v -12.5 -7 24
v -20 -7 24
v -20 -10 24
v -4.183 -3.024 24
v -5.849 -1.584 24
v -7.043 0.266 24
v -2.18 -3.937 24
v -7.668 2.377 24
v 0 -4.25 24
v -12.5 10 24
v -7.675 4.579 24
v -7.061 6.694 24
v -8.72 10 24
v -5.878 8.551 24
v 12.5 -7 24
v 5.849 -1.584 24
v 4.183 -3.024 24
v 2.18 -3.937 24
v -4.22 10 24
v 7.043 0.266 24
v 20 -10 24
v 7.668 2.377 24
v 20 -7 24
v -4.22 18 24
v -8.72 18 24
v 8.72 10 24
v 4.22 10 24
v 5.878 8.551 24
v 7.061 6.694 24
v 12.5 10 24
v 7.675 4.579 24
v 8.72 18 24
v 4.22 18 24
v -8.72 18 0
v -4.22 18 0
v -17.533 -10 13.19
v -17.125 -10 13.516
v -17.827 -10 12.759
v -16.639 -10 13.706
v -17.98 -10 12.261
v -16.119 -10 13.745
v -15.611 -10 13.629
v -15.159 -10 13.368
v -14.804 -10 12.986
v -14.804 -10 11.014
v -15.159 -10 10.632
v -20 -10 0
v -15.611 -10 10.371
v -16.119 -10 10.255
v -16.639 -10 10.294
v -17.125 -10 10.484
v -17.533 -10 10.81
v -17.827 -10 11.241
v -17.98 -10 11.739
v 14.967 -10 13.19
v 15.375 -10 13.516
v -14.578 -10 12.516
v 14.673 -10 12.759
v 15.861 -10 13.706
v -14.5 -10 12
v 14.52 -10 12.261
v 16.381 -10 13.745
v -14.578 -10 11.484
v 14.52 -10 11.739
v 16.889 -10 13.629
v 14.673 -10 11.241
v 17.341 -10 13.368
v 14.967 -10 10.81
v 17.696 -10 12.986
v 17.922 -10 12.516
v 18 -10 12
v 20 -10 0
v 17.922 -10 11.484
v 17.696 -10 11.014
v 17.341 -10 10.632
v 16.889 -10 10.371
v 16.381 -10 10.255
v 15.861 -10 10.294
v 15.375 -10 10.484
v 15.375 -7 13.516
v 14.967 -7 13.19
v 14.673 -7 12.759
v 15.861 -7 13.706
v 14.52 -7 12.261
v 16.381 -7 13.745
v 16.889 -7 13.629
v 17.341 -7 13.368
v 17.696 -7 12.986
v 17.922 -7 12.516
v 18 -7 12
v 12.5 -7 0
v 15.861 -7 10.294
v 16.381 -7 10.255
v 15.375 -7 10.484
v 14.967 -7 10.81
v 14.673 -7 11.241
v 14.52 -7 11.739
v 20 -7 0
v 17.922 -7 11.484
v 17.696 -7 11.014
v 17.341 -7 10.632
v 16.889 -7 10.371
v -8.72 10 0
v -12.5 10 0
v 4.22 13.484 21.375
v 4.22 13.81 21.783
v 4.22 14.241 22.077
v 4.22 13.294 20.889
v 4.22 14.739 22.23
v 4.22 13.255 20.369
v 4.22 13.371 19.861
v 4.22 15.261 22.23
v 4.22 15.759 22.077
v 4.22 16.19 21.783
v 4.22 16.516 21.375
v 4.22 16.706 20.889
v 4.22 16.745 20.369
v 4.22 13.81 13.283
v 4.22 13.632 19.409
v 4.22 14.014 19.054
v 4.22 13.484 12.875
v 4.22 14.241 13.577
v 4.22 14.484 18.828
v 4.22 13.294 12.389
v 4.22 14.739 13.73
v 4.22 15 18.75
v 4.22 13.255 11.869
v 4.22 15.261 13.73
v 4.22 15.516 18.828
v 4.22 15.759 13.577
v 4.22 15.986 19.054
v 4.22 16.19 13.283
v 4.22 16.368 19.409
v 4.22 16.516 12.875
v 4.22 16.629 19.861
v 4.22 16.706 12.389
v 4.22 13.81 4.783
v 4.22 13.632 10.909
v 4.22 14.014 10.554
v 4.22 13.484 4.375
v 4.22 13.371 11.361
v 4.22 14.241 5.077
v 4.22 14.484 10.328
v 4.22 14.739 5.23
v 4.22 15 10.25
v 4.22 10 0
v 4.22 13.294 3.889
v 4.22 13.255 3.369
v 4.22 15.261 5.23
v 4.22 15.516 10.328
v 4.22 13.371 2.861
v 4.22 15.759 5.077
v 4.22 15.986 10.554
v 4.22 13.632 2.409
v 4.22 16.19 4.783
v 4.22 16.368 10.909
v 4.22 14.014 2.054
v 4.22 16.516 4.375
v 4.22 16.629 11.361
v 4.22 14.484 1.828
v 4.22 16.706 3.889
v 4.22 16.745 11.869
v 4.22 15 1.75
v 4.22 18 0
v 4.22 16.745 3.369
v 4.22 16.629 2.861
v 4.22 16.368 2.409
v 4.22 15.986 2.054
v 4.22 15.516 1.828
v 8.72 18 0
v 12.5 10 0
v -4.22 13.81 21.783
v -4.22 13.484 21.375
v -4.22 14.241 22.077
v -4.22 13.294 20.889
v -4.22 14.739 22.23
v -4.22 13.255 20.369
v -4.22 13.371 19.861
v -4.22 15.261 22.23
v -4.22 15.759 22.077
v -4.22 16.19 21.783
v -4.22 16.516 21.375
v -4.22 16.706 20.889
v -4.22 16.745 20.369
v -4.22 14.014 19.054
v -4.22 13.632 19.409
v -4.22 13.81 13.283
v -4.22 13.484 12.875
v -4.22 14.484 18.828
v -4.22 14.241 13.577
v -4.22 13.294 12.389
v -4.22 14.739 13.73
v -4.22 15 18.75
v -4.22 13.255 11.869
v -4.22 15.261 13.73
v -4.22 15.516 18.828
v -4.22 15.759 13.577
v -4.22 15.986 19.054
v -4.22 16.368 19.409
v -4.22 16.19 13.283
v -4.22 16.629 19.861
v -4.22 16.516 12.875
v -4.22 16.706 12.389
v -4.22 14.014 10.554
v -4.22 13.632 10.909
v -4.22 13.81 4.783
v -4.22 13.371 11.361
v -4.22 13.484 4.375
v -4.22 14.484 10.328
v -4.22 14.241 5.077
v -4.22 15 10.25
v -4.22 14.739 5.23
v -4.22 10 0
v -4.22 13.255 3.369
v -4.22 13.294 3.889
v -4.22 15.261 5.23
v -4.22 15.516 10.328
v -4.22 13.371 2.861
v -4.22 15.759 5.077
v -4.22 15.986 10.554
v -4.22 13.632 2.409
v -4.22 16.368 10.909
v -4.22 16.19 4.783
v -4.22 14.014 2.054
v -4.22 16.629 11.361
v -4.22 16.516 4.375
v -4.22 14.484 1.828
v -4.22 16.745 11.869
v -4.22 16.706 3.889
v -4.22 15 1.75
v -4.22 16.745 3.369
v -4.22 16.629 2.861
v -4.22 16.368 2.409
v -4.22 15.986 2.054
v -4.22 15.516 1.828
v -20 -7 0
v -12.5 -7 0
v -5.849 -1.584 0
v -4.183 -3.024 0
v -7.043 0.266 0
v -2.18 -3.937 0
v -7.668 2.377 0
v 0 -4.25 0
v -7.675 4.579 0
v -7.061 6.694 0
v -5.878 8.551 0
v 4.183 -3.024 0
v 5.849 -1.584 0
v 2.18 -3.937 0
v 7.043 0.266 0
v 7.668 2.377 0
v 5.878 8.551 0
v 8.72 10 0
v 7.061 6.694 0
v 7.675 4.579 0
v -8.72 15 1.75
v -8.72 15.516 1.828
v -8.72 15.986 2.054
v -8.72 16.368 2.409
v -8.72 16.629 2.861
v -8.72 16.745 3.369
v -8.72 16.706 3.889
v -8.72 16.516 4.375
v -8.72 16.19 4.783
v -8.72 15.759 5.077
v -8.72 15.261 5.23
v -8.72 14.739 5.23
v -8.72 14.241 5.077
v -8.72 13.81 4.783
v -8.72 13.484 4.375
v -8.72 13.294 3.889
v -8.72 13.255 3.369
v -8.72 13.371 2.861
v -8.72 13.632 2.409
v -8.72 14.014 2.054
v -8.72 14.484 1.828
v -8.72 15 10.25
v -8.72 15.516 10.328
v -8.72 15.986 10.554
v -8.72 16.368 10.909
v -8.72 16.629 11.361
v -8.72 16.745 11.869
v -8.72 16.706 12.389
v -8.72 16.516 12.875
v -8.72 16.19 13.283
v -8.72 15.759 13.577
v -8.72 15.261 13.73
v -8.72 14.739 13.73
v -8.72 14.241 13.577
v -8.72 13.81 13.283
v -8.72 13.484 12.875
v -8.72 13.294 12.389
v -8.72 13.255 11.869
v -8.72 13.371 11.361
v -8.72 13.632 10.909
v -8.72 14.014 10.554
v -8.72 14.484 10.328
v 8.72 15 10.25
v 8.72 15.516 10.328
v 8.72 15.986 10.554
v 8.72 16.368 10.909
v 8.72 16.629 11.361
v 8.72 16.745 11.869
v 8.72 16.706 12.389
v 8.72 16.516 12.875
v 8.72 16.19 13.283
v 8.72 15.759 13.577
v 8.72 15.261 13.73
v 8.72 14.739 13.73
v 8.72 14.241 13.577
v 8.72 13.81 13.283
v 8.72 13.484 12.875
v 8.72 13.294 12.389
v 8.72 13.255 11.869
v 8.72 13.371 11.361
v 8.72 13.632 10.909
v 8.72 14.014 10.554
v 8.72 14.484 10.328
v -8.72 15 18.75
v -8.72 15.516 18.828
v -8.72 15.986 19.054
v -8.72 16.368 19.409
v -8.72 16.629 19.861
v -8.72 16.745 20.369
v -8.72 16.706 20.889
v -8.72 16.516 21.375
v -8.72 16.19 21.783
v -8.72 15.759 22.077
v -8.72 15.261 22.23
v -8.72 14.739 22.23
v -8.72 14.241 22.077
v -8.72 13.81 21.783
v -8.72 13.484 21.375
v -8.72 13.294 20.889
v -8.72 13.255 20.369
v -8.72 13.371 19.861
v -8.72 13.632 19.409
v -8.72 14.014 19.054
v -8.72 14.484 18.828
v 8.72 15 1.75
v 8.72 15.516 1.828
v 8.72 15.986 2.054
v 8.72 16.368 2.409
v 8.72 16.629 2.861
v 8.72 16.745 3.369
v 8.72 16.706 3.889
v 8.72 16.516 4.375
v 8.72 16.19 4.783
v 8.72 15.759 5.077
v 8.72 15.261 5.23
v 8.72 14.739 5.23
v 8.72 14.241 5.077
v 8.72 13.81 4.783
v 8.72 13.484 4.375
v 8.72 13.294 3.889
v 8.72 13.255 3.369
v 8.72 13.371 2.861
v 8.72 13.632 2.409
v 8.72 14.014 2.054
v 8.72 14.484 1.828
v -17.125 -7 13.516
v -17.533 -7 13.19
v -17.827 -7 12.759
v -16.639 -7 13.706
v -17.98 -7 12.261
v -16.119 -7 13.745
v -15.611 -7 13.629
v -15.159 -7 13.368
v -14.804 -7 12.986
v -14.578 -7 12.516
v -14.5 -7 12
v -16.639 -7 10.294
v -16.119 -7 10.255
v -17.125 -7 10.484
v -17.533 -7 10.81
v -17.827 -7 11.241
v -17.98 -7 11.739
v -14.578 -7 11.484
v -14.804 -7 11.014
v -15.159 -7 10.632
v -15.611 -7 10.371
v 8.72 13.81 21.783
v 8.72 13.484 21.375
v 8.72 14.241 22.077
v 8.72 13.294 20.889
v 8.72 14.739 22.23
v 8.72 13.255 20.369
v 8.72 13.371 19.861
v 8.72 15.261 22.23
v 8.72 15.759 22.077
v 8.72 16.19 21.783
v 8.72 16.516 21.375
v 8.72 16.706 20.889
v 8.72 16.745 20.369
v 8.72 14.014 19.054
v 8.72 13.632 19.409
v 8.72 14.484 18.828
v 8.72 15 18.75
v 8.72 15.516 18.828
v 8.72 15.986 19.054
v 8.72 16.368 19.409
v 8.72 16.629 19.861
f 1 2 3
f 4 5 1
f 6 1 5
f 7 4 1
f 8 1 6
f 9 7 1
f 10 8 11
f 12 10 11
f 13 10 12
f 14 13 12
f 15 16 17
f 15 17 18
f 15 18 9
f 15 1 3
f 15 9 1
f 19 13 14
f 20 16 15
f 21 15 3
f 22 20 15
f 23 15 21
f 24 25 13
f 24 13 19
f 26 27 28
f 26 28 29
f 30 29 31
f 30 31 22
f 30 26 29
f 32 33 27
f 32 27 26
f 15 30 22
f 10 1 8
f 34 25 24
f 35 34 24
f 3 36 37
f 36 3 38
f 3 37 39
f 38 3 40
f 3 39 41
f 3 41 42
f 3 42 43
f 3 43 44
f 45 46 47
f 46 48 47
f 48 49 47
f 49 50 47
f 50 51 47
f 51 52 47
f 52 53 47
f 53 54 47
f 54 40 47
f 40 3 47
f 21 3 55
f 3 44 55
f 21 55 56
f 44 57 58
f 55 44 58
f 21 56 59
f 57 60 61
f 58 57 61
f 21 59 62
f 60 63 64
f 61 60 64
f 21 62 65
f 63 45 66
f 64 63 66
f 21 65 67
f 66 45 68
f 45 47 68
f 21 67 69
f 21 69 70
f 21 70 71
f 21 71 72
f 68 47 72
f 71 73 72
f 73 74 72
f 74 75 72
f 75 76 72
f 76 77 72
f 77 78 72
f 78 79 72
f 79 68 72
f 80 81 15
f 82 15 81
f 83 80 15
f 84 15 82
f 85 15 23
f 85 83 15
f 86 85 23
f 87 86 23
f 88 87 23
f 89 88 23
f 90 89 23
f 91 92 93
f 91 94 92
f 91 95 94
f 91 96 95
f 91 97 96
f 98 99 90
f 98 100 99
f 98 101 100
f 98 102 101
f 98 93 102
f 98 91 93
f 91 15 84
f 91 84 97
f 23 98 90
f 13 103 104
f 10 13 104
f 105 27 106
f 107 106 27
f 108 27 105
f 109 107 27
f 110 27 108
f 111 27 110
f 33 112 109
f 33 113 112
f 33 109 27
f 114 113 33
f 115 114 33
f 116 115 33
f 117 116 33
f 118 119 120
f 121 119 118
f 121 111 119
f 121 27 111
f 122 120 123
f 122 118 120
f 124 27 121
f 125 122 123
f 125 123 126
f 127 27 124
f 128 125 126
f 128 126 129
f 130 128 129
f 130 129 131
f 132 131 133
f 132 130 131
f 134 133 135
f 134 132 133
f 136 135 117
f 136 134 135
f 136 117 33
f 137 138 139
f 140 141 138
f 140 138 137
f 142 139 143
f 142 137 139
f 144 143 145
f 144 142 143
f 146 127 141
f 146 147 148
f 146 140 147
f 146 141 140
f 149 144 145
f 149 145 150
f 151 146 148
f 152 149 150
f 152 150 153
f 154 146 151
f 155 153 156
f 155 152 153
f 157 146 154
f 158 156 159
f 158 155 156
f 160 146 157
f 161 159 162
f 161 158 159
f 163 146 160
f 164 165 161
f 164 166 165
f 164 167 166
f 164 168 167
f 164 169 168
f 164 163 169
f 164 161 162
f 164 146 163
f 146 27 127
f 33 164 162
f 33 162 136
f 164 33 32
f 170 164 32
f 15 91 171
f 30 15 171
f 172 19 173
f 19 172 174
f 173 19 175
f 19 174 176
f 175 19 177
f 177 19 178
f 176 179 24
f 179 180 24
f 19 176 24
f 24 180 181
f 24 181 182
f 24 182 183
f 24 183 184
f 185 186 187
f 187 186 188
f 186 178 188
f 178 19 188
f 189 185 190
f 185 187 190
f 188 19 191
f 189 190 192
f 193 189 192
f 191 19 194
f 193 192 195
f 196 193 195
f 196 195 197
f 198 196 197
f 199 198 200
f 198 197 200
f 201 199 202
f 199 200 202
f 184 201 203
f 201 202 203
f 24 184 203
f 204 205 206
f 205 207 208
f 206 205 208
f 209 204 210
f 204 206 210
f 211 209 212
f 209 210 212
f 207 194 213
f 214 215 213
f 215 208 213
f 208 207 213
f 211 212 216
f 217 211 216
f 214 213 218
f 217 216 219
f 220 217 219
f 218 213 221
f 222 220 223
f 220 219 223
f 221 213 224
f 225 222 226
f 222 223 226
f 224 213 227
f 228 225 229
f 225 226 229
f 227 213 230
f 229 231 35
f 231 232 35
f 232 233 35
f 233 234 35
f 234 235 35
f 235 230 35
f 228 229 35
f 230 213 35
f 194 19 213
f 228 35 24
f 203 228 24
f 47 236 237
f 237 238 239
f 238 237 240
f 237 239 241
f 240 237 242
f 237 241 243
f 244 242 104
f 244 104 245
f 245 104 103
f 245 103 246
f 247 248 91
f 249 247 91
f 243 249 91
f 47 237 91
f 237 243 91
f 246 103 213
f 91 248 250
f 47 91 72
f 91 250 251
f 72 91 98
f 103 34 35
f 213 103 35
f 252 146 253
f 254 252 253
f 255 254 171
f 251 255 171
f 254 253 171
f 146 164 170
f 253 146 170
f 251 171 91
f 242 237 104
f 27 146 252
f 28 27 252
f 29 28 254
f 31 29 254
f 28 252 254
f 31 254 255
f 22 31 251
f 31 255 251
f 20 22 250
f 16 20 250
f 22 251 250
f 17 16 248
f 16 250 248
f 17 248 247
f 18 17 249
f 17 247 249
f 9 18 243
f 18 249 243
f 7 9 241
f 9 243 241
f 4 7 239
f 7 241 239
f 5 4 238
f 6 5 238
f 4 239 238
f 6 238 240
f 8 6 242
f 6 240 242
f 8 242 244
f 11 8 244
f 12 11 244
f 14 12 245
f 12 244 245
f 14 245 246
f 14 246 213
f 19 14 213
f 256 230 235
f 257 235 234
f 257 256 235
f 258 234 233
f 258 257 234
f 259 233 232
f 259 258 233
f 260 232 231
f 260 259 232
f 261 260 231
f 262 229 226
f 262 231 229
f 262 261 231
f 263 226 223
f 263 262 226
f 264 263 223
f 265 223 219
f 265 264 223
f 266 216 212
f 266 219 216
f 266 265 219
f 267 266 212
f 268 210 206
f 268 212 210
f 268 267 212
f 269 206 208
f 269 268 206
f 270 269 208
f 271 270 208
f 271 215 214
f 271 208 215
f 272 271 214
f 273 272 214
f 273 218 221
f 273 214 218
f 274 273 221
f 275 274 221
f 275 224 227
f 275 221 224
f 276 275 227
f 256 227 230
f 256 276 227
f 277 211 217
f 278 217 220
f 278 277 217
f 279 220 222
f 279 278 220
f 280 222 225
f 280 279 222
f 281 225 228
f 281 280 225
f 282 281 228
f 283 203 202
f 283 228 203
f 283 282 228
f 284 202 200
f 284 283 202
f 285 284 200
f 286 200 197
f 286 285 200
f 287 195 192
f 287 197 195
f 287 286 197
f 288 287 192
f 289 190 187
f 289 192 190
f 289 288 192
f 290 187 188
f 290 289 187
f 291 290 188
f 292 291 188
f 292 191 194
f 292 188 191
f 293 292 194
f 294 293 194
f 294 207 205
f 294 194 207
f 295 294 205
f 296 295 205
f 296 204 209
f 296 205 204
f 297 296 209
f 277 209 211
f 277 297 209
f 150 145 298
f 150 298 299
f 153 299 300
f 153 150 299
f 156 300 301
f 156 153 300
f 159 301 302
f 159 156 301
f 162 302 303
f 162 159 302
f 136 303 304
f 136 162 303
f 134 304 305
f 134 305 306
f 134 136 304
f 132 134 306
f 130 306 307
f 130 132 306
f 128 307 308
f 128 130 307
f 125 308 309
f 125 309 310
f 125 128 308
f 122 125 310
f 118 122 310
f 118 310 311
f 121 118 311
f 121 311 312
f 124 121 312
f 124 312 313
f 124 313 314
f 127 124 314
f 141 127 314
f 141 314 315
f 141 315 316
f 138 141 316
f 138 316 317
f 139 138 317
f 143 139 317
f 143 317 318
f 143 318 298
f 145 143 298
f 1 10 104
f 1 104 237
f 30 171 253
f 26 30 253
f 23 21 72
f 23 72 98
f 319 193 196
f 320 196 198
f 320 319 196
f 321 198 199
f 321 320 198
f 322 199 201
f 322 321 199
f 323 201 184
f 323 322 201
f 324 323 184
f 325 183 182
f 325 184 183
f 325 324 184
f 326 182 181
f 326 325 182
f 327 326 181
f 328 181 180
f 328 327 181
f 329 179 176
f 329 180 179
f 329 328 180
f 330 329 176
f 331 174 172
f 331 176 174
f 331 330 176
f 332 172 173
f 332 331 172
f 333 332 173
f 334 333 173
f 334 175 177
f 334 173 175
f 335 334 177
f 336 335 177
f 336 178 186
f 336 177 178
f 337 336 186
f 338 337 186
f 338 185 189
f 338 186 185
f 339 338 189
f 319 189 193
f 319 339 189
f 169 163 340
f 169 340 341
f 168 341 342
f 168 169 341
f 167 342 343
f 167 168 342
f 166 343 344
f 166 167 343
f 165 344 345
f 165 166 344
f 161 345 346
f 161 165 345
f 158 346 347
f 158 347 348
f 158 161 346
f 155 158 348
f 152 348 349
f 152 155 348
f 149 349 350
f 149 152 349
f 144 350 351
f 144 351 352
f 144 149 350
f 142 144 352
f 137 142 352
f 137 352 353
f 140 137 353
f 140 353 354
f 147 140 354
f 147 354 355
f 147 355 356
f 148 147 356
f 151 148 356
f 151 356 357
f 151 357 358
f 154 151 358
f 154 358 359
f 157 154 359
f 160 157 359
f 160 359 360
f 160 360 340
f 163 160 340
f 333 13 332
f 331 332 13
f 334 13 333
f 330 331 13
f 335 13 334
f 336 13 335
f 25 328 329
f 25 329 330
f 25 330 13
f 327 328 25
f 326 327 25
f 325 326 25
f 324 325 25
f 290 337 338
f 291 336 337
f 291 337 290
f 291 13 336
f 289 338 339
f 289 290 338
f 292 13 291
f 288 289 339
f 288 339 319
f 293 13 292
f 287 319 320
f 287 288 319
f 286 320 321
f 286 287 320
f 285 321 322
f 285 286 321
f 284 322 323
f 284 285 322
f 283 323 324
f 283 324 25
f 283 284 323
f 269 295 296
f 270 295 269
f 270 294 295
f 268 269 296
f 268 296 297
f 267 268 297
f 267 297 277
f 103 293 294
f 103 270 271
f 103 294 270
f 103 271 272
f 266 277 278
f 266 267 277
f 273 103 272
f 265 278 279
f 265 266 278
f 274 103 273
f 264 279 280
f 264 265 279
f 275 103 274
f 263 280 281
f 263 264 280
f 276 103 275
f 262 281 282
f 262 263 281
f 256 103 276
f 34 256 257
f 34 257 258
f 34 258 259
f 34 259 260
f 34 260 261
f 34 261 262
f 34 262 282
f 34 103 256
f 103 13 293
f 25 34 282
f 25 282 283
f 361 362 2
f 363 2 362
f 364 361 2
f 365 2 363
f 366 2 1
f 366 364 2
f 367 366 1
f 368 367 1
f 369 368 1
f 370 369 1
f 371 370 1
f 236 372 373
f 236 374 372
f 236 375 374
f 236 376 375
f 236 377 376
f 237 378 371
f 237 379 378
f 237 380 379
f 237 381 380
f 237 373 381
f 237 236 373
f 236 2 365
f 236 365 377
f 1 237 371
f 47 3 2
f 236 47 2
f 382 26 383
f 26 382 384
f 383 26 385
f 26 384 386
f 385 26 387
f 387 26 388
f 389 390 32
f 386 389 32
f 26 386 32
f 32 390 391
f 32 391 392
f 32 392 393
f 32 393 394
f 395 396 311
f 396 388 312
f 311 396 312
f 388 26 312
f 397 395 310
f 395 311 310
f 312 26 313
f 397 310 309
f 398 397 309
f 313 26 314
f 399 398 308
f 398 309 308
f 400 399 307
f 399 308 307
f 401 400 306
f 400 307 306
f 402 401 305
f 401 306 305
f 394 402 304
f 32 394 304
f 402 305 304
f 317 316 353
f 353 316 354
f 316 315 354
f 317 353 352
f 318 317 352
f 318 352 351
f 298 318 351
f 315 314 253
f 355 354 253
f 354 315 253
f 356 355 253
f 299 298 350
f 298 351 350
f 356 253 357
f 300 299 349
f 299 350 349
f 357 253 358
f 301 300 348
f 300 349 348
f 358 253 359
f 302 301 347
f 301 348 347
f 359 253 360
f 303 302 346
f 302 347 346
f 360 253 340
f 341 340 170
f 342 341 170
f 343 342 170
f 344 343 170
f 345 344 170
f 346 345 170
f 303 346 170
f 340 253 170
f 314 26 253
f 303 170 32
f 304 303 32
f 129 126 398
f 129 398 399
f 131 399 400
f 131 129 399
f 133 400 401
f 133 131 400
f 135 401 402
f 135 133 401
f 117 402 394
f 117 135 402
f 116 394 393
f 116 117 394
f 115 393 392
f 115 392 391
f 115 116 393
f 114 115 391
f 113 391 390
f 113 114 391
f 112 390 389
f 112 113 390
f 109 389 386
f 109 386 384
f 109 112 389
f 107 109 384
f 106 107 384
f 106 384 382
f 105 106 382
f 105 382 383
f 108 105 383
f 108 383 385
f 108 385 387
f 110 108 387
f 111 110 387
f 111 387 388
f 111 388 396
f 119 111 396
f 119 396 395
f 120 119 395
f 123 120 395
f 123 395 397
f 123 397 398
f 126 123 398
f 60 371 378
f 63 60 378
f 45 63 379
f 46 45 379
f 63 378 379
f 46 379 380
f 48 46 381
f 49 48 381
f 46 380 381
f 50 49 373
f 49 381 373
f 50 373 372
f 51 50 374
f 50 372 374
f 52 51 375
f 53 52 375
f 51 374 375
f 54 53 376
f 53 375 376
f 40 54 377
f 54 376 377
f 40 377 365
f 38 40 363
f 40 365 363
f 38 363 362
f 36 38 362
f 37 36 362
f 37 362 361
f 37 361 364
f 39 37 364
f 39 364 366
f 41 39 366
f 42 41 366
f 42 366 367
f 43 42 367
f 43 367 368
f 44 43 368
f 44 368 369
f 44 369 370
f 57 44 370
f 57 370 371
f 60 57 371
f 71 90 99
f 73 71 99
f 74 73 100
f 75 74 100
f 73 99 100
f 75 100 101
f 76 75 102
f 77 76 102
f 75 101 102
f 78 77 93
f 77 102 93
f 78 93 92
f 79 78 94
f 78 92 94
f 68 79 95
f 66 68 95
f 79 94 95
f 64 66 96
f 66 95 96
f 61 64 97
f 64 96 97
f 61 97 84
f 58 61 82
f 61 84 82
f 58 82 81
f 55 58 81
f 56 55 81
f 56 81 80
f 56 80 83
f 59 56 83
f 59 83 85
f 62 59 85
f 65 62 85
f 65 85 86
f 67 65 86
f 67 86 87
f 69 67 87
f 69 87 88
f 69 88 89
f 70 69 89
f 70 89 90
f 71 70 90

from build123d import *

# Parameters (mm, degrees)
SALIENTE_EXTRUIR2_DEPTH = 24
CROQUIS2_W              = 4.5
CROQUIS2_H              = 8
SALIENTE_EXTRUIR3_DEPTH = 24
CROQUIS3_W              = 7.5
CROQUIS3_H              = 3
SALIENTE_EXTRUIR4_DEPTH = 24
CORTAR_EXTRUIR1_START   = -8.720486
CROQUIS4_R              = 1.75
CORTAR_EXTRUIR1_DEPTH   = 17.440972
CROQUIS5_R              = 1.75
CORTAR_EXTRUIR2_DEPTH   = 10


with BuildPart() as part:
    # Croquis1 → Saliente-Extruir2 (new body)
    with BuildSketch(Plane.XY):
        with BuildLine():
            Line((-4.220485754, 10), (-12.5, 10))
            Line((-12.5, 10), (-12.5, -10))
            Line((-12.5, -10), (12.5, -10))
            Line((12.5, -10), (12.5, 10))
            Line((12.5, 10), (4.220485754, 10))
            ThreePointArc((4.220485754, 10), (0, -4.25), (-4.220485754, 10))
        make_face()
    extrude(amount=SALIENTE_EXTRUIR2_DEPTH)

    # Croquis2 → Saliente-Extruir3 (add)
    with BuildSketch(Plane.XY):
        with Locations((-6.470485754, 14)):
            Rectangle(CROQUIS2_W, CROQUIS2_H)
        with Locations((6.470485754, 14)):
            Rectangle(CROQUIS2_W, CROQUIS2_H)
    extrude(amount=SALIENTE_EXTRUIR3_DEPTH)

    # Croquis3 → Saliente-Extruir4 (add)
    with BuildSketch(Plane.XY):
        with Locations((-16.25, -8.5)):
            Rectangle(CROQUIS3_W, CROQUIS3_H)
        with Locations((16.25, -8.5)):
            Rectangle(CROQUIS3_W, CROQUIS3_H)
    extrude(amount=SALIENTE_EXTRUIR4_DEPTH)

    # Croquis4 → Cortar-Extruir1 (cut)
    with BuildSketch(Plane(origin=(0, 0, 0), x_dir=(0, 0, -1), z_dir=(1, 0, 0)).offset(CORTAR_EXTRUIR1_START)):
        with Locations((-20.5, 15)):
            Circle(CROQUIS4_R)
        with Locations((-12, 15)):
            Circle(CROQUIS4_R)
        with Locations((-3.5, 15)):
            Circle(CROQUIS4_R)
    extrude(amount=CORTAR_EXTRUIR1_DEPTH, mode=Mode.SUBTRACT)

    # Croquis5 → Cortar-Extruir2 (cut)
    with BuildSketch(Plane(origin=(0, 0, 0), x_dir=(1, 0, 0), z_dir=(0, 1, 0))):
        with Locations((-16.25, -12)):
            Circle(CROQUIS5_R)
        with Locations((16.25, -12)):
            Circle(CROQUIS5_R)
    extrude(amount=-CORTAR_EXTRUIR2_DEPTH, mode=Mode.SUBTRACT)


solid = part.part
